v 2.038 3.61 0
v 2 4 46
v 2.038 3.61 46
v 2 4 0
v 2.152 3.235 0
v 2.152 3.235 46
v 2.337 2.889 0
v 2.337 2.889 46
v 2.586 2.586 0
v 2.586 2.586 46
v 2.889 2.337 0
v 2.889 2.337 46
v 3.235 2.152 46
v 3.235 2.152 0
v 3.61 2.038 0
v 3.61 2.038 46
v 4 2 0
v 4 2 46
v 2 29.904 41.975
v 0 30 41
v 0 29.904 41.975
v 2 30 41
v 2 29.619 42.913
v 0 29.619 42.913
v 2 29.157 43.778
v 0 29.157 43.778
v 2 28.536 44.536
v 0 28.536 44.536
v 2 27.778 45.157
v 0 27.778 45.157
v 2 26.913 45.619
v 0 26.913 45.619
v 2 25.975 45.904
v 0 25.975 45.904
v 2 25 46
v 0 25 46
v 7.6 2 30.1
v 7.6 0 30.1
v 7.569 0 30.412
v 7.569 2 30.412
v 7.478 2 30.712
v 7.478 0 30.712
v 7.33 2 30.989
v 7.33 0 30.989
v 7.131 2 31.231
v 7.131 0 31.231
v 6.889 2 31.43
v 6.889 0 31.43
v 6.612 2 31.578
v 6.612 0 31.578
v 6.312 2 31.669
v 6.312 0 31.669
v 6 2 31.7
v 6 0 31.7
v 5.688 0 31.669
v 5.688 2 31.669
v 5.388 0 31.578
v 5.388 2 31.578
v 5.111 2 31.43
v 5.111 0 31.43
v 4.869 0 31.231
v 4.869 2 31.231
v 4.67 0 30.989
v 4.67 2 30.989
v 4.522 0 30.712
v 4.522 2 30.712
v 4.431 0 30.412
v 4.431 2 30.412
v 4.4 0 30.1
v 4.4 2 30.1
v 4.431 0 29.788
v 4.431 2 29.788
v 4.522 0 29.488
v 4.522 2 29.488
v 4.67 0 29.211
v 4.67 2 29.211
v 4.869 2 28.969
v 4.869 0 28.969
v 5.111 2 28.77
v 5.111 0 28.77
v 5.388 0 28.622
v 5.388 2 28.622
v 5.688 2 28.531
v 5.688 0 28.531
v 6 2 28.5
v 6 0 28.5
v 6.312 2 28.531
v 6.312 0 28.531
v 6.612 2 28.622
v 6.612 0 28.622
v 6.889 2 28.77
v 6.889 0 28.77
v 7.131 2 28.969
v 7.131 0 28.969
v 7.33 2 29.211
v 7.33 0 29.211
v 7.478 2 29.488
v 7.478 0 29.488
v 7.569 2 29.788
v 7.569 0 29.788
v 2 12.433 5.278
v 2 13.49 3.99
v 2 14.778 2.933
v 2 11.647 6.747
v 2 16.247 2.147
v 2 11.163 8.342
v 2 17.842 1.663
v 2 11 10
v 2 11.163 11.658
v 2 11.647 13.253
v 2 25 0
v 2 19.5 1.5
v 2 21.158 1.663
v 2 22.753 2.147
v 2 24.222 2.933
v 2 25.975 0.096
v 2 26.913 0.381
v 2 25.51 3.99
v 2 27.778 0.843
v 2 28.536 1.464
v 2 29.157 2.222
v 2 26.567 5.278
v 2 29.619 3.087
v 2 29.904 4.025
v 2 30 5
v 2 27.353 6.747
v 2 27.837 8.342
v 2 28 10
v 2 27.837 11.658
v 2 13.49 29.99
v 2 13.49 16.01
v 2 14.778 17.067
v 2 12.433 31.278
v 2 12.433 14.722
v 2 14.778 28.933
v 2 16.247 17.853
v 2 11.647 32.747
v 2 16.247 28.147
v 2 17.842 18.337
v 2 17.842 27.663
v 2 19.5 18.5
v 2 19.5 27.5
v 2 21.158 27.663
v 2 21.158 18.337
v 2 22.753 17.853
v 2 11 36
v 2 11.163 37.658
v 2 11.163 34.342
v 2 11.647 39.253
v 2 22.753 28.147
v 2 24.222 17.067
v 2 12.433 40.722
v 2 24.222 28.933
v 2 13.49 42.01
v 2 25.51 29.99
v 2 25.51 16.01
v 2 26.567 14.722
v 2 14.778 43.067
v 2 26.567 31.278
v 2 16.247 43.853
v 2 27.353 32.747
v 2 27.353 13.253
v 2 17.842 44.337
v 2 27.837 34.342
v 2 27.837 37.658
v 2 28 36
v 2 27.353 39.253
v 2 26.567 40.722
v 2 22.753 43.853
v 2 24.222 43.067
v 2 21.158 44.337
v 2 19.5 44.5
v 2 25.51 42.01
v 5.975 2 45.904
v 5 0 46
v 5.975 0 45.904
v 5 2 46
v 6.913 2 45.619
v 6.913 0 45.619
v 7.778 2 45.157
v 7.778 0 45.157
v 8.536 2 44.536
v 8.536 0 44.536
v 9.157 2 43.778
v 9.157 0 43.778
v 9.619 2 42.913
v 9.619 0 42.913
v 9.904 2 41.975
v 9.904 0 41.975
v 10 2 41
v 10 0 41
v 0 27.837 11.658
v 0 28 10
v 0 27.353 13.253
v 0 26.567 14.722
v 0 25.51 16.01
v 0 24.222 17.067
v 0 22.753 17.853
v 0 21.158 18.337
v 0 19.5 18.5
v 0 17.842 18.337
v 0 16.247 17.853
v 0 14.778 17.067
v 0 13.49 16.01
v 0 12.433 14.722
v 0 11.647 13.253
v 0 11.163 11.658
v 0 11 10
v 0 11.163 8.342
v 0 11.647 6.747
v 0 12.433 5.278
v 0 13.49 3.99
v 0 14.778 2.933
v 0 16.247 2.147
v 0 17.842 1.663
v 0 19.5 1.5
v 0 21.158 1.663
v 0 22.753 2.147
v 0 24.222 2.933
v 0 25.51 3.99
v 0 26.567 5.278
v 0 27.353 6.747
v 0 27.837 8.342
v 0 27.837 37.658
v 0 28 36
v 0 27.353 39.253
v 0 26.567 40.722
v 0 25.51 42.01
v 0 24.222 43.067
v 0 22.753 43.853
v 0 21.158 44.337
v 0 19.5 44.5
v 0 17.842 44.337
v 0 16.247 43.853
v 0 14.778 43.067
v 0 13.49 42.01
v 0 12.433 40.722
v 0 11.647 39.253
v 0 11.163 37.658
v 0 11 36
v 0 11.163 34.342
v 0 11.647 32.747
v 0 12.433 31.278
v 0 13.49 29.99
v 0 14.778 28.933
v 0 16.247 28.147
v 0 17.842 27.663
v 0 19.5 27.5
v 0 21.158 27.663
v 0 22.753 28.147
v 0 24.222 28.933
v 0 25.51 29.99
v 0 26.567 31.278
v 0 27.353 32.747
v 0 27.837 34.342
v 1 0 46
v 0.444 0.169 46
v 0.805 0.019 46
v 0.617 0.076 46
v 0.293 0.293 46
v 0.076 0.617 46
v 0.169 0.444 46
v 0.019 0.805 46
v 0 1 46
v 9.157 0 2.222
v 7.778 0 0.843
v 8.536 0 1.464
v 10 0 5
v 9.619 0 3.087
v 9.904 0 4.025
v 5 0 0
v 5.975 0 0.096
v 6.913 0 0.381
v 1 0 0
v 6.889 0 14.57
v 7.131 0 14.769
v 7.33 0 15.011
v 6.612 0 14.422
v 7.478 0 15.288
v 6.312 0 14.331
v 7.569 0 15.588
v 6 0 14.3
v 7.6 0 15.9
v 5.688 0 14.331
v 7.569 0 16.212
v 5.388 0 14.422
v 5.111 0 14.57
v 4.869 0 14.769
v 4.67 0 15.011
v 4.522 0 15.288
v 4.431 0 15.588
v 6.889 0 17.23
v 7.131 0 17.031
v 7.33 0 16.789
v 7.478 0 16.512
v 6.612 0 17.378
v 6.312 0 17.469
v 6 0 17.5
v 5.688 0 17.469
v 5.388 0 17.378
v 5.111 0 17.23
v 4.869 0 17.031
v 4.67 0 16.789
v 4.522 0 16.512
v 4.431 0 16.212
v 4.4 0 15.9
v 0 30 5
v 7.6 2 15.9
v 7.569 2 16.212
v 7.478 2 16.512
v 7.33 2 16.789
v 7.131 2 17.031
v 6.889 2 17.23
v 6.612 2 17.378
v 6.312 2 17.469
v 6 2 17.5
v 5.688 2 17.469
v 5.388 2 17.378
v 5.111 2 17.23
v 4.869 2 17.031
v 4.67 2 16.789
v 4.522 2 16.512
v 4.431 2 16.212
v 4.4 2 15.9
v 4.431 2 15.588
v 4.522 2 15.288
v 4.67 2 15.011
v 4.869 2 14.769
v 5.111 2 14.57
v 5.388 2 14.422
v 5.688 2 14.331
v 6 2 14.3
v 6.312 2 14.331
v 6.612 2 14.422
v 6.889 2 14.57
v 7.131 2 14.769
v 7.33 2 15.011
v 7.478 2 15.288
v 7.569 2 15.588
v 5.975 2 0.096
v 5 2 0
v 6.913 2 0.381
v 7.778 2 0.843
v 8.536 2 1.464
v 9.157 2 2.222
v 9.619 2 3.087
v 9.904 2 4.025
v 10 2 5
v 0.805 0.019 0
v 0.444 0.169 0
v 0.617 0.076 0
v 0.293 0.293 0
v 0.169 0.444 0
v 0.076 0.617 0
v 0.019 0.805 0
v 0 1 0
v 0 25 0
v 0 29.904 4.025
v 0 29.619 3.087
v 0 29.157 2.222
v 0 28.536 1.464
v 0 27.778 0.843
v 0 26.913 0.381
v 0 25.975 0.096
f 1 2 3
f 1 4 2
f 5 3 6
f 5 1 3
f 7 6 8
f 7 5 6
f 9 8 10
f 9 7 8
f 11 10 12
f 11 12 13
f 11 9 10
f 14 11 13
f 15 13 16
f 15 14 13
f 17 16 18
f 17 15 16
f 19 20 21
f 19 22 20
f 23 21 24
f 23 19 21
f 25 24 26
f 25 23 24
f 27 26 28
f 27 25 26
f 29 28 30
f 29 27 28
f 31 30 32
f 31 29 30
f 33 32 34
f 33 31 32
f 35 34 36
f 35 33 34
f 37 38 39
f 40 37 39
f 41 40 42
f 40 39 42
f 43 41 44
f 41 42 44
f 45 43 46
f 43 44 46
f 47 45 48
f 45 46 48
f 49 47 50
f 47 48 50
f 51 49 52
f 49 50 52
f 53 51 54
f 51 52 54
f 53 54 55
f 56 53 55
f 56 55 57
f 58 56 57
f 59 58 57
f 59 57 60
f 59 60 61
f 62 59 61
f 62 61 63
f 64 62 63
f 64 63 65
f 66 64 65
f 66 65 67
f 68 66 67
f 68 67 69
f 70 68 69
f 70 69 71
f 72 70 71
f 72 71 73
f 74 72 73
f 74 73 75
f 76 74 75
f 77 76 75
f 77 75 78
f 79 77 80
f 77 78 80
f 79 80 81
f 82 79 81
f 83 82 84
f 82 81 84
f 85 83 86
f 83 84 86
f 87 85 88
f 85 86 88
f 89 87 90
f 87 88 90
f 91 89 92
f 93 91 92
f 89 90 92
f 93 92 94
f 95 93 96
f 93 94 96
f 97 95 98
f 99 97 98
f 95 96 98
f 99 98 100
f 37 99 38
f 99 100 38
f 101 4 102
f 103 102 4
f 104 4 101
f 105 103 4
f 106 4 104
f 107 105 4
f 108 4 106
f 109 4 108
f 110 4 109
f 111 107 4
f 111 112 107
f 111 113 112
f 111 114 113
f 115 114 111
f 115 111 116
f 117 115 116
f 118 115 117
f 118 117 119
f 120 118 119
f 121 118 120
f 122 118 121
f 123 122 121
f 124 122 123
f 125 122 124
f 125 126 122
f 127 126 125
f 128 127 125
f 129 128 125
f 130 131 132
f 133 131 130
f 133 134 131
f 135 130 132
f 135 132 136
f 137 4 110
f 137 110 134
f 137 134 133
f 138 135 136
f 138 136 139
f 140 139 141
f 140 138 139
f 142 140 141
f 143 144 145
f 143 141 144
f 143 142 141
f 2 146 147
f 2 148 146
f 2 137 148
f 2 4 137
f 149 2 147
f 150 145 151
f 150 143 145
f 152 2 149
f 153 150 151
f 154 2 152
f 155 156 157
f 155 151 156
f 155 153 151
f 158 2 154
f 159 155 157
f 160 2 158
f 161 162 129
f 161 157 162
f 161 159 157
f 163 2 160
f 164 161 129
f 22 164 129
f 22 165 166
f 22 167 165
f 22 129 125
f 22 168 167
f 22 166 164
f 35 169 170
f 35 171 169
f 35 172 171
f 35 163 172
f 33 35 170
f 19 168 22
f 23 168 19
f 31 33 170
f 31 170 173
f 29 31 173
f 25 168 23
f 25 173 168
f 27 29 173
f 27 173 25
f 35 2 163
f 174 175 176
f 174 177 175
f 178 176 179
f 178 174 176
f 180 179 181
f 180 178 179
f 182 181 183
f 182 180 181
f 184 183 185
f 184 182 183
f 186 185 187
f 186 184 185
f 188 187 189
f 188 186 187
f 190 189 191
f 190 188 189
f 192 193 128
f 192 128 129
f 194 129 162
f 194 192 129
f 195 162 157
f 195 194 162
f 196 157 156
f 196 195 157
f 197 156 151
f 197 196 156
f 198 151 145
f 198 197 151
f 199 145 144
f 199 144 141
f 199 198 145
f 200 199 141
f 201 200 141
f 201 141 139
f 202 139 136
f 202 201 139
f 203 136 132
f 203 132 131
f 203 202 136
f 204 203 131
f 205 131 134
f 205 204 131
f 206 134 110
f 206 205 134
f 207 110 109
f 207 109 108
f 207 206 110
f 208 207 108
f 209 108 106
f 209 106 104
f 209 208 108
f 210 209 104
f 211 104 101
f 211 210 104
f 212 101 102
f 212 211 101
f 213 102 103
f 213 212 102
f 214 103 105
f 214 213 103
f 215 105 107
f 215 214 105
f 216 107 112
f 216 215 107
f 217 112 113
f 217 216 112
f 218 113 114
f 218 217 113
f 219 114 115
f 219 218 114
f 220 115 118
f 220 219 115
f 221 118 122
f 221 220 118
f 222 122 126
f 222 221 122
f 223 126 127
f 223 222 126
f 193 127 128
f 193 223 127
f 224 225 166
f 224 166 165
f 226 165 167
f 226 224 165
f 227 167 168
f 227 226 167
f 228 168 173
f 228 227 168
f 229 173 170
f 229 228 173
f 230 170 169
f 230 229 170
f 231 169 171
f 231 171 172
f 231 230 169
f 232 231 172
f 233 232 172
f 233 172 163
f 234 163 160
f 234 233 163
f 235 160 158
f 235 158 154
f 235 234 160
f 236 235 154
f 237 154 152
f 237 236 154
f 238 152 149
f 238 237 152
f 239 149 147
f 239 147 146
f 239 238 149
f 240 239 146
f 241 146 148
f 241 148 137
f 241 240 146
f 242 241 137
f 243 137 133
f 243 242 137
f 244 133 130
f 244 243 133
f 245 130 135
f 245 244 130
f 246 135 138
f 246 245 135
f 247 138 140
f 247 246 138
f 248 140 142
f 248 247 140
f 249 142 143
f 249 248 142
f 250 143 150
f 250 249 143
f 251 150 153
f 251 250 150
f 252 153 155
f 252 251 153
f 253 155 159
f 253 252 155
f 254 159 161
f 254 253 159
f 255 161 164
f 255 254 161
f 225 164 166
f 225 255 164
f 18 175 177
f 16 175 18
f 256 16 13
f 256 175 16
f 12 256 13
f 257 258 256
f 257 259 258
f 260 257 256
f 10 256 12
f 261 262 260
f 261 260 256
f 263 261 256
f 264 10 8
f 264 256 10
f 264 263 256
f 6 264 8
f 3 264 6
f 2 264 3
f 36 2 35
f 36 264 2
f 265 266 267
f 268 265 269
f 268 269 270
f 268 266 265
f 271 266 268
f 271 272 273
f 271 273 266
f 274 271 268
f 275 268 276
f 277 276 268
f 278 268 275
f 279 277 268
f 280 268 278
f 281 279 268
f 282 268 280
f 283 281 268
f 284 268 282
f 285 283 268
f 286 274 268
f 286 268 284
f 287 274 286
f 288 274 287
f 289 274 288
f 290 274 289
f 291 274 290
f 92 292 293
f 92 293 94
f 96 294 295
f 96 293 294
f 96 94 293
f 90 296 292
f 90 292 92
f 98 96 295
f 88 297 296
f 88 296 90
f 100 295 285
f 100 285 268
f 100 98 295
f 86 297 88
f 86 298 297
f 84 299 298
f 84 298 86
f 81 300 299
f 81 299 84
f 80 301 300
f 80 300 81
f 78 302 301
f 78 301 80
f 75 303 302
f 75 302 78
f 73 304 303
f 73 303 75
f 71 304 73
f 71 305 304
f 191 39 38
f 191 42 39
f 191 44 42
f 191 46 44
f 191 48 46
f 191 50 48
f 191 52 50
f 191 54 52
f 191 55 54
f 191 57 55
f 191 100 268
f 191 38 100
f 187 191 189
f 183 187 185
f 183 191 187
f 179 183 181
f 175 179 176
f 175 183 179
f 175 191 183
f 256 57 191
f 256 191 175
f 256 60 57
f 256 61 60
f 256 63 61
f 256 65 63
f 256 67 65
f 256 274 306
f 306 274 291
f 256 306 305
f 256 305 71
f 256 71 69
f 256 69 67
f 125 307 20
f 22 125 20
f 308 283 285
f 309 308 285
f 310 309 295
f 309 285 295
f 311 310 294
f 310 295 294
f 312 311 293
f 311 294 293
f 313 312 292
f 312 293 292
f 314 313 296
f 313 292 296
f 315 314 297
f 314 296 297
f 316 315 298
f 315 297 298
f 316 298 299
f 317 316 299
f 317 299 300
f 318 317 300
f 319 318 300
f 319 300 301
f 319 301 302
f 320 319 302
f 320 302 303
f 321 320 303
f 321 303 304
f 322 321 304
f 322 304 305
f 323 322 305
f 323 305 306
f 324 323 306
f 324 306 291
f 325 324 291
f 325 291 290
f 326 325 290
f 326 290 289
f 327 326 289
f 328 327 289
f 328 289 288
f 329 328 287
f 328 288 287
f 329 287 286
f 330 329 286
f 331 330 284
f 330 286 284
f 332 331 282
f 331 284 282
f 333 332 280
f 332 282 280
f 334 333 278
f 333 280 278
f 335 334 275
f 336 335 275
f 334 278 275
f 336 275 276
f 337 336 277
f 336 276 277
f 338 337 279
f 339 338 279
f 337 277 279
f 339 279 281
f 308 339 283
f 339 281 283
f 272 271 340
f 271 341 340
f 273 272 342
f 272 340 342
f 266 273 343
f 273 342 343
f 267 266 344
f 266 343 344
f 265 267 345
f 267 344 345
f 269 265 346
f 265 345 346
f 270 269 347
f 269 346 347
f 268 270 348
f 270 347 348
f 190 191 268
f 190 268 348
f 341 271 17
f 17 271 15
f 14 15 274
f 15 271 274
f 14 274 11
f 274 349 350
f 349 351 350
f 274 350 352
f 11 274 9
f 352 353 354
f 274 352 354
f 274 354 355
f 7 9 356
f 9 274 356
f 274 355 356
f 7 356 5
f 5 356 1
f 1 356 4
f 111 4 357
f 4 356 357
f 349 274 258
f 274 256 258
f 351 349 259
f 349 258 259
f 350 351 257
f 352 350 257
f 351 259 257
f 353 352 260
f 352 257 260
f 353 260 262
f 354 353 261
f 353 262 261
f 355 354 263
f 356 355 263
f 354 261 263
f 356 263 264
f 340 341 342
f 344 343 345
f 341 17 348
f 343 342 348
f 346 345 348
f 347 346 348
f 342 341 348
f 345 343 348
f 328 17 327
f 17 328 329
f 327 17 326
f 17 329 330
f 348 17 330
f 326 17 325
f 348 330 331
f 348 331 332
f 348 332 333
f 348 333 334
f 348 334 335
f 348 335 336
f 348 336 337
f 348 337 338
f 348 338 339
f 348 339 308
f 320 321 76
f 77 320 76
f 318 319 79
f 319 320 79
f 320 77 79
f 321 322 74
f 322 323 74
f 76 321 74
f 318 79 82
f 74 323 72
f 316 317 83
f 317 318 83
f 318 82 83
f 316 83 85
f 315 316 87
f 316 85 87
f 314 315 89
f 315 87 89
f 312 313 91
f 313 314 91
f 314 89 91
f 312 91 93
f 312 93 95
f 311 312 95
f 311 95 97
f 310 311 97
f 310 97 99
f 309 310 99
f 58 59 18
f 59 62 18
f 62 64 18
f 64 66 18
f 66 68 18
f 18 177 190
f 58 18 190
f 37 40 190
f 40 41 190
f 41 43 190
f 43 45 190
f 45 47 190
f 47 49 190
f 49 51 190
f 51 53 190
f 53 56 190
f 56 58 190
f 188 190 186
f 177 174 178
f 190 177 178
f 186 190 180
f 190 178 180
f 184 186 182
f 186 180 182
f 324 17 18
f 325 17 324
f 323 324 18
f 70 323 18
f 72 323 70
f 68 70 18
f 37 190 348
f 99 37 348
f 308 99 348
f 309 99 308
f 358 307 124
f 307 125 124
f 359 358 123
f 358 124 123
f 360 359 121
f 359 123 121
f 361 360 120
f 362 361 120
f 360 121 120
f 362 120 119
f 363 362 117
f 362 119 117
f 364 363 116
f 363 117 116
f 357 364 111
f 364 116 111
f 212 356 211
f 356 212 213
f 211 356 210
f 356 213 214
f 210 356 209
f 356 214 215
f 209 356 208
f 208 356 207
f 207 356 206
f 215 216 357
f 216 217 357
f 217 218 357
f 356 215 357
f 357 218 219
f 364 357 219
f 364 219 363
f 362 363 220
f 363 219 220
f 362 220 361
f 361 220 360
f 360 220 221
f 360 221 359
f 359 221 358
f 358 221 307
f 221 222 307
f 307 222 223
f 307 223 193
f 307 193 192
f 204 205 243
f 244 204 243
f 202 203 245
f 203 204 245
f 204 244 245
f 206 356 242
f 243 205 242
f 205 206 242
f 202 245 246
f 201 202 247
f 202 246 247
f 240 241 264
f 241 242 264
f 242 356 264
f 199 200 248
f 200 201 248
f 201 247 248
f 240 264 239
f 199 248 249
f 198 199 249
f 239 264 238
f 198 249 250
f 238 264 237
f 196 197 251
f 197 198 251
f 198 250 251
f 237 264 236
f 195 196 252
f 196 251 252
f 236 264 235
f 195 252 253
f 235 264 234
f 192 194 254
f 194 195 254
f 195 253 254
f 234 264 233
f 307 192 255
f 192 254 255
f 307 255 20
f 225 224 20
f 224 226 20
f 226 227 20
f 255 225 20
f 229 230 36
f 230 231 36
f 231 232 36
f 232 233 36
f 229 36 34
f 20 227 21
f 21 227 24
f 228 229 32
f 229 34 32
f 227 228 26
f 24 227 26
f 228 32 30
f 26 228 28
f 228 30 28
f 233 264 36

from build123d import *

# Parameters (mm, degrees)
F0_W     = 30
F0_H     = 46
F0_R     = 8.5
F1_DEPTH = 2
F2_W     = 10
F2_H     = 2
F3_DEPTH = 46
F4_R     = 1.6
F5_DEPTH = 25
F6_R     = 1
F7_R     = 2
F8_R     = 5
F9_R     = 5


with BuildPart() as f1:
    # F0 (on Right) → F1 (new body)
    with BuildSketch(Plane.YZ):
        with Locations((15, 23)):
            Rectangle(F0_W, F0_H)
        with Locations((19.5, 10)):
            Circle(F0_R, mode=Mode.SUBTRACT)
        with Locations((19.5, 36)):
            Circle(F0_R, mode=Mode.SUBTRACT)
    extrude(amount=F1_DEPTH)

    # F2 (on face) → F3 (join)
    with BuildSketch(Plane.XY.offset(46)):
        with Locations((5, 1)):
            Rectangle(F2_W, F2_H)
    extrude(amount=-F3_DEPTH)

    # F4 (on face) → F5 (cut)
    with BuildSketch(Plane.XZ):
        with Locations((6, 30.1)):
            Circle(F4_R)
        with Locations((6, 15.9)):
            Circle(F4_R)
    extrude(amount=-F5_DEPTH, mode=Mode.SUBTRACT)

    # F6
    f6_edges = [f1.edges().sort_by_distance(p)[0] for p in [
        (0, 0, 23),
    ]]
    fillet(f6_edges, radius=F6_R)

    # F7
    f7_edges = [f1.edges().sort_by_distance(p)[0] for p in [
        (2, 2, 23),
    ]]
    fillet(f7_edges, radius=F7_R)

    # F8
    f8_edges = [f1.edges().sort_by_distance(p)[0] for p in [
        (1, 30, 46),
    ]]
    fillet(f8_edges, radius=F8_R)

    # F9
    f9_edges = [f1.edges().sort_by_distance(p)[0] for p in [
        (1, 30, 0),
        (10, 1, 46),
        (10, 1, 0),
    ]]
    fillet(f9_edges, radius=F9_R)


solid = f1.part
